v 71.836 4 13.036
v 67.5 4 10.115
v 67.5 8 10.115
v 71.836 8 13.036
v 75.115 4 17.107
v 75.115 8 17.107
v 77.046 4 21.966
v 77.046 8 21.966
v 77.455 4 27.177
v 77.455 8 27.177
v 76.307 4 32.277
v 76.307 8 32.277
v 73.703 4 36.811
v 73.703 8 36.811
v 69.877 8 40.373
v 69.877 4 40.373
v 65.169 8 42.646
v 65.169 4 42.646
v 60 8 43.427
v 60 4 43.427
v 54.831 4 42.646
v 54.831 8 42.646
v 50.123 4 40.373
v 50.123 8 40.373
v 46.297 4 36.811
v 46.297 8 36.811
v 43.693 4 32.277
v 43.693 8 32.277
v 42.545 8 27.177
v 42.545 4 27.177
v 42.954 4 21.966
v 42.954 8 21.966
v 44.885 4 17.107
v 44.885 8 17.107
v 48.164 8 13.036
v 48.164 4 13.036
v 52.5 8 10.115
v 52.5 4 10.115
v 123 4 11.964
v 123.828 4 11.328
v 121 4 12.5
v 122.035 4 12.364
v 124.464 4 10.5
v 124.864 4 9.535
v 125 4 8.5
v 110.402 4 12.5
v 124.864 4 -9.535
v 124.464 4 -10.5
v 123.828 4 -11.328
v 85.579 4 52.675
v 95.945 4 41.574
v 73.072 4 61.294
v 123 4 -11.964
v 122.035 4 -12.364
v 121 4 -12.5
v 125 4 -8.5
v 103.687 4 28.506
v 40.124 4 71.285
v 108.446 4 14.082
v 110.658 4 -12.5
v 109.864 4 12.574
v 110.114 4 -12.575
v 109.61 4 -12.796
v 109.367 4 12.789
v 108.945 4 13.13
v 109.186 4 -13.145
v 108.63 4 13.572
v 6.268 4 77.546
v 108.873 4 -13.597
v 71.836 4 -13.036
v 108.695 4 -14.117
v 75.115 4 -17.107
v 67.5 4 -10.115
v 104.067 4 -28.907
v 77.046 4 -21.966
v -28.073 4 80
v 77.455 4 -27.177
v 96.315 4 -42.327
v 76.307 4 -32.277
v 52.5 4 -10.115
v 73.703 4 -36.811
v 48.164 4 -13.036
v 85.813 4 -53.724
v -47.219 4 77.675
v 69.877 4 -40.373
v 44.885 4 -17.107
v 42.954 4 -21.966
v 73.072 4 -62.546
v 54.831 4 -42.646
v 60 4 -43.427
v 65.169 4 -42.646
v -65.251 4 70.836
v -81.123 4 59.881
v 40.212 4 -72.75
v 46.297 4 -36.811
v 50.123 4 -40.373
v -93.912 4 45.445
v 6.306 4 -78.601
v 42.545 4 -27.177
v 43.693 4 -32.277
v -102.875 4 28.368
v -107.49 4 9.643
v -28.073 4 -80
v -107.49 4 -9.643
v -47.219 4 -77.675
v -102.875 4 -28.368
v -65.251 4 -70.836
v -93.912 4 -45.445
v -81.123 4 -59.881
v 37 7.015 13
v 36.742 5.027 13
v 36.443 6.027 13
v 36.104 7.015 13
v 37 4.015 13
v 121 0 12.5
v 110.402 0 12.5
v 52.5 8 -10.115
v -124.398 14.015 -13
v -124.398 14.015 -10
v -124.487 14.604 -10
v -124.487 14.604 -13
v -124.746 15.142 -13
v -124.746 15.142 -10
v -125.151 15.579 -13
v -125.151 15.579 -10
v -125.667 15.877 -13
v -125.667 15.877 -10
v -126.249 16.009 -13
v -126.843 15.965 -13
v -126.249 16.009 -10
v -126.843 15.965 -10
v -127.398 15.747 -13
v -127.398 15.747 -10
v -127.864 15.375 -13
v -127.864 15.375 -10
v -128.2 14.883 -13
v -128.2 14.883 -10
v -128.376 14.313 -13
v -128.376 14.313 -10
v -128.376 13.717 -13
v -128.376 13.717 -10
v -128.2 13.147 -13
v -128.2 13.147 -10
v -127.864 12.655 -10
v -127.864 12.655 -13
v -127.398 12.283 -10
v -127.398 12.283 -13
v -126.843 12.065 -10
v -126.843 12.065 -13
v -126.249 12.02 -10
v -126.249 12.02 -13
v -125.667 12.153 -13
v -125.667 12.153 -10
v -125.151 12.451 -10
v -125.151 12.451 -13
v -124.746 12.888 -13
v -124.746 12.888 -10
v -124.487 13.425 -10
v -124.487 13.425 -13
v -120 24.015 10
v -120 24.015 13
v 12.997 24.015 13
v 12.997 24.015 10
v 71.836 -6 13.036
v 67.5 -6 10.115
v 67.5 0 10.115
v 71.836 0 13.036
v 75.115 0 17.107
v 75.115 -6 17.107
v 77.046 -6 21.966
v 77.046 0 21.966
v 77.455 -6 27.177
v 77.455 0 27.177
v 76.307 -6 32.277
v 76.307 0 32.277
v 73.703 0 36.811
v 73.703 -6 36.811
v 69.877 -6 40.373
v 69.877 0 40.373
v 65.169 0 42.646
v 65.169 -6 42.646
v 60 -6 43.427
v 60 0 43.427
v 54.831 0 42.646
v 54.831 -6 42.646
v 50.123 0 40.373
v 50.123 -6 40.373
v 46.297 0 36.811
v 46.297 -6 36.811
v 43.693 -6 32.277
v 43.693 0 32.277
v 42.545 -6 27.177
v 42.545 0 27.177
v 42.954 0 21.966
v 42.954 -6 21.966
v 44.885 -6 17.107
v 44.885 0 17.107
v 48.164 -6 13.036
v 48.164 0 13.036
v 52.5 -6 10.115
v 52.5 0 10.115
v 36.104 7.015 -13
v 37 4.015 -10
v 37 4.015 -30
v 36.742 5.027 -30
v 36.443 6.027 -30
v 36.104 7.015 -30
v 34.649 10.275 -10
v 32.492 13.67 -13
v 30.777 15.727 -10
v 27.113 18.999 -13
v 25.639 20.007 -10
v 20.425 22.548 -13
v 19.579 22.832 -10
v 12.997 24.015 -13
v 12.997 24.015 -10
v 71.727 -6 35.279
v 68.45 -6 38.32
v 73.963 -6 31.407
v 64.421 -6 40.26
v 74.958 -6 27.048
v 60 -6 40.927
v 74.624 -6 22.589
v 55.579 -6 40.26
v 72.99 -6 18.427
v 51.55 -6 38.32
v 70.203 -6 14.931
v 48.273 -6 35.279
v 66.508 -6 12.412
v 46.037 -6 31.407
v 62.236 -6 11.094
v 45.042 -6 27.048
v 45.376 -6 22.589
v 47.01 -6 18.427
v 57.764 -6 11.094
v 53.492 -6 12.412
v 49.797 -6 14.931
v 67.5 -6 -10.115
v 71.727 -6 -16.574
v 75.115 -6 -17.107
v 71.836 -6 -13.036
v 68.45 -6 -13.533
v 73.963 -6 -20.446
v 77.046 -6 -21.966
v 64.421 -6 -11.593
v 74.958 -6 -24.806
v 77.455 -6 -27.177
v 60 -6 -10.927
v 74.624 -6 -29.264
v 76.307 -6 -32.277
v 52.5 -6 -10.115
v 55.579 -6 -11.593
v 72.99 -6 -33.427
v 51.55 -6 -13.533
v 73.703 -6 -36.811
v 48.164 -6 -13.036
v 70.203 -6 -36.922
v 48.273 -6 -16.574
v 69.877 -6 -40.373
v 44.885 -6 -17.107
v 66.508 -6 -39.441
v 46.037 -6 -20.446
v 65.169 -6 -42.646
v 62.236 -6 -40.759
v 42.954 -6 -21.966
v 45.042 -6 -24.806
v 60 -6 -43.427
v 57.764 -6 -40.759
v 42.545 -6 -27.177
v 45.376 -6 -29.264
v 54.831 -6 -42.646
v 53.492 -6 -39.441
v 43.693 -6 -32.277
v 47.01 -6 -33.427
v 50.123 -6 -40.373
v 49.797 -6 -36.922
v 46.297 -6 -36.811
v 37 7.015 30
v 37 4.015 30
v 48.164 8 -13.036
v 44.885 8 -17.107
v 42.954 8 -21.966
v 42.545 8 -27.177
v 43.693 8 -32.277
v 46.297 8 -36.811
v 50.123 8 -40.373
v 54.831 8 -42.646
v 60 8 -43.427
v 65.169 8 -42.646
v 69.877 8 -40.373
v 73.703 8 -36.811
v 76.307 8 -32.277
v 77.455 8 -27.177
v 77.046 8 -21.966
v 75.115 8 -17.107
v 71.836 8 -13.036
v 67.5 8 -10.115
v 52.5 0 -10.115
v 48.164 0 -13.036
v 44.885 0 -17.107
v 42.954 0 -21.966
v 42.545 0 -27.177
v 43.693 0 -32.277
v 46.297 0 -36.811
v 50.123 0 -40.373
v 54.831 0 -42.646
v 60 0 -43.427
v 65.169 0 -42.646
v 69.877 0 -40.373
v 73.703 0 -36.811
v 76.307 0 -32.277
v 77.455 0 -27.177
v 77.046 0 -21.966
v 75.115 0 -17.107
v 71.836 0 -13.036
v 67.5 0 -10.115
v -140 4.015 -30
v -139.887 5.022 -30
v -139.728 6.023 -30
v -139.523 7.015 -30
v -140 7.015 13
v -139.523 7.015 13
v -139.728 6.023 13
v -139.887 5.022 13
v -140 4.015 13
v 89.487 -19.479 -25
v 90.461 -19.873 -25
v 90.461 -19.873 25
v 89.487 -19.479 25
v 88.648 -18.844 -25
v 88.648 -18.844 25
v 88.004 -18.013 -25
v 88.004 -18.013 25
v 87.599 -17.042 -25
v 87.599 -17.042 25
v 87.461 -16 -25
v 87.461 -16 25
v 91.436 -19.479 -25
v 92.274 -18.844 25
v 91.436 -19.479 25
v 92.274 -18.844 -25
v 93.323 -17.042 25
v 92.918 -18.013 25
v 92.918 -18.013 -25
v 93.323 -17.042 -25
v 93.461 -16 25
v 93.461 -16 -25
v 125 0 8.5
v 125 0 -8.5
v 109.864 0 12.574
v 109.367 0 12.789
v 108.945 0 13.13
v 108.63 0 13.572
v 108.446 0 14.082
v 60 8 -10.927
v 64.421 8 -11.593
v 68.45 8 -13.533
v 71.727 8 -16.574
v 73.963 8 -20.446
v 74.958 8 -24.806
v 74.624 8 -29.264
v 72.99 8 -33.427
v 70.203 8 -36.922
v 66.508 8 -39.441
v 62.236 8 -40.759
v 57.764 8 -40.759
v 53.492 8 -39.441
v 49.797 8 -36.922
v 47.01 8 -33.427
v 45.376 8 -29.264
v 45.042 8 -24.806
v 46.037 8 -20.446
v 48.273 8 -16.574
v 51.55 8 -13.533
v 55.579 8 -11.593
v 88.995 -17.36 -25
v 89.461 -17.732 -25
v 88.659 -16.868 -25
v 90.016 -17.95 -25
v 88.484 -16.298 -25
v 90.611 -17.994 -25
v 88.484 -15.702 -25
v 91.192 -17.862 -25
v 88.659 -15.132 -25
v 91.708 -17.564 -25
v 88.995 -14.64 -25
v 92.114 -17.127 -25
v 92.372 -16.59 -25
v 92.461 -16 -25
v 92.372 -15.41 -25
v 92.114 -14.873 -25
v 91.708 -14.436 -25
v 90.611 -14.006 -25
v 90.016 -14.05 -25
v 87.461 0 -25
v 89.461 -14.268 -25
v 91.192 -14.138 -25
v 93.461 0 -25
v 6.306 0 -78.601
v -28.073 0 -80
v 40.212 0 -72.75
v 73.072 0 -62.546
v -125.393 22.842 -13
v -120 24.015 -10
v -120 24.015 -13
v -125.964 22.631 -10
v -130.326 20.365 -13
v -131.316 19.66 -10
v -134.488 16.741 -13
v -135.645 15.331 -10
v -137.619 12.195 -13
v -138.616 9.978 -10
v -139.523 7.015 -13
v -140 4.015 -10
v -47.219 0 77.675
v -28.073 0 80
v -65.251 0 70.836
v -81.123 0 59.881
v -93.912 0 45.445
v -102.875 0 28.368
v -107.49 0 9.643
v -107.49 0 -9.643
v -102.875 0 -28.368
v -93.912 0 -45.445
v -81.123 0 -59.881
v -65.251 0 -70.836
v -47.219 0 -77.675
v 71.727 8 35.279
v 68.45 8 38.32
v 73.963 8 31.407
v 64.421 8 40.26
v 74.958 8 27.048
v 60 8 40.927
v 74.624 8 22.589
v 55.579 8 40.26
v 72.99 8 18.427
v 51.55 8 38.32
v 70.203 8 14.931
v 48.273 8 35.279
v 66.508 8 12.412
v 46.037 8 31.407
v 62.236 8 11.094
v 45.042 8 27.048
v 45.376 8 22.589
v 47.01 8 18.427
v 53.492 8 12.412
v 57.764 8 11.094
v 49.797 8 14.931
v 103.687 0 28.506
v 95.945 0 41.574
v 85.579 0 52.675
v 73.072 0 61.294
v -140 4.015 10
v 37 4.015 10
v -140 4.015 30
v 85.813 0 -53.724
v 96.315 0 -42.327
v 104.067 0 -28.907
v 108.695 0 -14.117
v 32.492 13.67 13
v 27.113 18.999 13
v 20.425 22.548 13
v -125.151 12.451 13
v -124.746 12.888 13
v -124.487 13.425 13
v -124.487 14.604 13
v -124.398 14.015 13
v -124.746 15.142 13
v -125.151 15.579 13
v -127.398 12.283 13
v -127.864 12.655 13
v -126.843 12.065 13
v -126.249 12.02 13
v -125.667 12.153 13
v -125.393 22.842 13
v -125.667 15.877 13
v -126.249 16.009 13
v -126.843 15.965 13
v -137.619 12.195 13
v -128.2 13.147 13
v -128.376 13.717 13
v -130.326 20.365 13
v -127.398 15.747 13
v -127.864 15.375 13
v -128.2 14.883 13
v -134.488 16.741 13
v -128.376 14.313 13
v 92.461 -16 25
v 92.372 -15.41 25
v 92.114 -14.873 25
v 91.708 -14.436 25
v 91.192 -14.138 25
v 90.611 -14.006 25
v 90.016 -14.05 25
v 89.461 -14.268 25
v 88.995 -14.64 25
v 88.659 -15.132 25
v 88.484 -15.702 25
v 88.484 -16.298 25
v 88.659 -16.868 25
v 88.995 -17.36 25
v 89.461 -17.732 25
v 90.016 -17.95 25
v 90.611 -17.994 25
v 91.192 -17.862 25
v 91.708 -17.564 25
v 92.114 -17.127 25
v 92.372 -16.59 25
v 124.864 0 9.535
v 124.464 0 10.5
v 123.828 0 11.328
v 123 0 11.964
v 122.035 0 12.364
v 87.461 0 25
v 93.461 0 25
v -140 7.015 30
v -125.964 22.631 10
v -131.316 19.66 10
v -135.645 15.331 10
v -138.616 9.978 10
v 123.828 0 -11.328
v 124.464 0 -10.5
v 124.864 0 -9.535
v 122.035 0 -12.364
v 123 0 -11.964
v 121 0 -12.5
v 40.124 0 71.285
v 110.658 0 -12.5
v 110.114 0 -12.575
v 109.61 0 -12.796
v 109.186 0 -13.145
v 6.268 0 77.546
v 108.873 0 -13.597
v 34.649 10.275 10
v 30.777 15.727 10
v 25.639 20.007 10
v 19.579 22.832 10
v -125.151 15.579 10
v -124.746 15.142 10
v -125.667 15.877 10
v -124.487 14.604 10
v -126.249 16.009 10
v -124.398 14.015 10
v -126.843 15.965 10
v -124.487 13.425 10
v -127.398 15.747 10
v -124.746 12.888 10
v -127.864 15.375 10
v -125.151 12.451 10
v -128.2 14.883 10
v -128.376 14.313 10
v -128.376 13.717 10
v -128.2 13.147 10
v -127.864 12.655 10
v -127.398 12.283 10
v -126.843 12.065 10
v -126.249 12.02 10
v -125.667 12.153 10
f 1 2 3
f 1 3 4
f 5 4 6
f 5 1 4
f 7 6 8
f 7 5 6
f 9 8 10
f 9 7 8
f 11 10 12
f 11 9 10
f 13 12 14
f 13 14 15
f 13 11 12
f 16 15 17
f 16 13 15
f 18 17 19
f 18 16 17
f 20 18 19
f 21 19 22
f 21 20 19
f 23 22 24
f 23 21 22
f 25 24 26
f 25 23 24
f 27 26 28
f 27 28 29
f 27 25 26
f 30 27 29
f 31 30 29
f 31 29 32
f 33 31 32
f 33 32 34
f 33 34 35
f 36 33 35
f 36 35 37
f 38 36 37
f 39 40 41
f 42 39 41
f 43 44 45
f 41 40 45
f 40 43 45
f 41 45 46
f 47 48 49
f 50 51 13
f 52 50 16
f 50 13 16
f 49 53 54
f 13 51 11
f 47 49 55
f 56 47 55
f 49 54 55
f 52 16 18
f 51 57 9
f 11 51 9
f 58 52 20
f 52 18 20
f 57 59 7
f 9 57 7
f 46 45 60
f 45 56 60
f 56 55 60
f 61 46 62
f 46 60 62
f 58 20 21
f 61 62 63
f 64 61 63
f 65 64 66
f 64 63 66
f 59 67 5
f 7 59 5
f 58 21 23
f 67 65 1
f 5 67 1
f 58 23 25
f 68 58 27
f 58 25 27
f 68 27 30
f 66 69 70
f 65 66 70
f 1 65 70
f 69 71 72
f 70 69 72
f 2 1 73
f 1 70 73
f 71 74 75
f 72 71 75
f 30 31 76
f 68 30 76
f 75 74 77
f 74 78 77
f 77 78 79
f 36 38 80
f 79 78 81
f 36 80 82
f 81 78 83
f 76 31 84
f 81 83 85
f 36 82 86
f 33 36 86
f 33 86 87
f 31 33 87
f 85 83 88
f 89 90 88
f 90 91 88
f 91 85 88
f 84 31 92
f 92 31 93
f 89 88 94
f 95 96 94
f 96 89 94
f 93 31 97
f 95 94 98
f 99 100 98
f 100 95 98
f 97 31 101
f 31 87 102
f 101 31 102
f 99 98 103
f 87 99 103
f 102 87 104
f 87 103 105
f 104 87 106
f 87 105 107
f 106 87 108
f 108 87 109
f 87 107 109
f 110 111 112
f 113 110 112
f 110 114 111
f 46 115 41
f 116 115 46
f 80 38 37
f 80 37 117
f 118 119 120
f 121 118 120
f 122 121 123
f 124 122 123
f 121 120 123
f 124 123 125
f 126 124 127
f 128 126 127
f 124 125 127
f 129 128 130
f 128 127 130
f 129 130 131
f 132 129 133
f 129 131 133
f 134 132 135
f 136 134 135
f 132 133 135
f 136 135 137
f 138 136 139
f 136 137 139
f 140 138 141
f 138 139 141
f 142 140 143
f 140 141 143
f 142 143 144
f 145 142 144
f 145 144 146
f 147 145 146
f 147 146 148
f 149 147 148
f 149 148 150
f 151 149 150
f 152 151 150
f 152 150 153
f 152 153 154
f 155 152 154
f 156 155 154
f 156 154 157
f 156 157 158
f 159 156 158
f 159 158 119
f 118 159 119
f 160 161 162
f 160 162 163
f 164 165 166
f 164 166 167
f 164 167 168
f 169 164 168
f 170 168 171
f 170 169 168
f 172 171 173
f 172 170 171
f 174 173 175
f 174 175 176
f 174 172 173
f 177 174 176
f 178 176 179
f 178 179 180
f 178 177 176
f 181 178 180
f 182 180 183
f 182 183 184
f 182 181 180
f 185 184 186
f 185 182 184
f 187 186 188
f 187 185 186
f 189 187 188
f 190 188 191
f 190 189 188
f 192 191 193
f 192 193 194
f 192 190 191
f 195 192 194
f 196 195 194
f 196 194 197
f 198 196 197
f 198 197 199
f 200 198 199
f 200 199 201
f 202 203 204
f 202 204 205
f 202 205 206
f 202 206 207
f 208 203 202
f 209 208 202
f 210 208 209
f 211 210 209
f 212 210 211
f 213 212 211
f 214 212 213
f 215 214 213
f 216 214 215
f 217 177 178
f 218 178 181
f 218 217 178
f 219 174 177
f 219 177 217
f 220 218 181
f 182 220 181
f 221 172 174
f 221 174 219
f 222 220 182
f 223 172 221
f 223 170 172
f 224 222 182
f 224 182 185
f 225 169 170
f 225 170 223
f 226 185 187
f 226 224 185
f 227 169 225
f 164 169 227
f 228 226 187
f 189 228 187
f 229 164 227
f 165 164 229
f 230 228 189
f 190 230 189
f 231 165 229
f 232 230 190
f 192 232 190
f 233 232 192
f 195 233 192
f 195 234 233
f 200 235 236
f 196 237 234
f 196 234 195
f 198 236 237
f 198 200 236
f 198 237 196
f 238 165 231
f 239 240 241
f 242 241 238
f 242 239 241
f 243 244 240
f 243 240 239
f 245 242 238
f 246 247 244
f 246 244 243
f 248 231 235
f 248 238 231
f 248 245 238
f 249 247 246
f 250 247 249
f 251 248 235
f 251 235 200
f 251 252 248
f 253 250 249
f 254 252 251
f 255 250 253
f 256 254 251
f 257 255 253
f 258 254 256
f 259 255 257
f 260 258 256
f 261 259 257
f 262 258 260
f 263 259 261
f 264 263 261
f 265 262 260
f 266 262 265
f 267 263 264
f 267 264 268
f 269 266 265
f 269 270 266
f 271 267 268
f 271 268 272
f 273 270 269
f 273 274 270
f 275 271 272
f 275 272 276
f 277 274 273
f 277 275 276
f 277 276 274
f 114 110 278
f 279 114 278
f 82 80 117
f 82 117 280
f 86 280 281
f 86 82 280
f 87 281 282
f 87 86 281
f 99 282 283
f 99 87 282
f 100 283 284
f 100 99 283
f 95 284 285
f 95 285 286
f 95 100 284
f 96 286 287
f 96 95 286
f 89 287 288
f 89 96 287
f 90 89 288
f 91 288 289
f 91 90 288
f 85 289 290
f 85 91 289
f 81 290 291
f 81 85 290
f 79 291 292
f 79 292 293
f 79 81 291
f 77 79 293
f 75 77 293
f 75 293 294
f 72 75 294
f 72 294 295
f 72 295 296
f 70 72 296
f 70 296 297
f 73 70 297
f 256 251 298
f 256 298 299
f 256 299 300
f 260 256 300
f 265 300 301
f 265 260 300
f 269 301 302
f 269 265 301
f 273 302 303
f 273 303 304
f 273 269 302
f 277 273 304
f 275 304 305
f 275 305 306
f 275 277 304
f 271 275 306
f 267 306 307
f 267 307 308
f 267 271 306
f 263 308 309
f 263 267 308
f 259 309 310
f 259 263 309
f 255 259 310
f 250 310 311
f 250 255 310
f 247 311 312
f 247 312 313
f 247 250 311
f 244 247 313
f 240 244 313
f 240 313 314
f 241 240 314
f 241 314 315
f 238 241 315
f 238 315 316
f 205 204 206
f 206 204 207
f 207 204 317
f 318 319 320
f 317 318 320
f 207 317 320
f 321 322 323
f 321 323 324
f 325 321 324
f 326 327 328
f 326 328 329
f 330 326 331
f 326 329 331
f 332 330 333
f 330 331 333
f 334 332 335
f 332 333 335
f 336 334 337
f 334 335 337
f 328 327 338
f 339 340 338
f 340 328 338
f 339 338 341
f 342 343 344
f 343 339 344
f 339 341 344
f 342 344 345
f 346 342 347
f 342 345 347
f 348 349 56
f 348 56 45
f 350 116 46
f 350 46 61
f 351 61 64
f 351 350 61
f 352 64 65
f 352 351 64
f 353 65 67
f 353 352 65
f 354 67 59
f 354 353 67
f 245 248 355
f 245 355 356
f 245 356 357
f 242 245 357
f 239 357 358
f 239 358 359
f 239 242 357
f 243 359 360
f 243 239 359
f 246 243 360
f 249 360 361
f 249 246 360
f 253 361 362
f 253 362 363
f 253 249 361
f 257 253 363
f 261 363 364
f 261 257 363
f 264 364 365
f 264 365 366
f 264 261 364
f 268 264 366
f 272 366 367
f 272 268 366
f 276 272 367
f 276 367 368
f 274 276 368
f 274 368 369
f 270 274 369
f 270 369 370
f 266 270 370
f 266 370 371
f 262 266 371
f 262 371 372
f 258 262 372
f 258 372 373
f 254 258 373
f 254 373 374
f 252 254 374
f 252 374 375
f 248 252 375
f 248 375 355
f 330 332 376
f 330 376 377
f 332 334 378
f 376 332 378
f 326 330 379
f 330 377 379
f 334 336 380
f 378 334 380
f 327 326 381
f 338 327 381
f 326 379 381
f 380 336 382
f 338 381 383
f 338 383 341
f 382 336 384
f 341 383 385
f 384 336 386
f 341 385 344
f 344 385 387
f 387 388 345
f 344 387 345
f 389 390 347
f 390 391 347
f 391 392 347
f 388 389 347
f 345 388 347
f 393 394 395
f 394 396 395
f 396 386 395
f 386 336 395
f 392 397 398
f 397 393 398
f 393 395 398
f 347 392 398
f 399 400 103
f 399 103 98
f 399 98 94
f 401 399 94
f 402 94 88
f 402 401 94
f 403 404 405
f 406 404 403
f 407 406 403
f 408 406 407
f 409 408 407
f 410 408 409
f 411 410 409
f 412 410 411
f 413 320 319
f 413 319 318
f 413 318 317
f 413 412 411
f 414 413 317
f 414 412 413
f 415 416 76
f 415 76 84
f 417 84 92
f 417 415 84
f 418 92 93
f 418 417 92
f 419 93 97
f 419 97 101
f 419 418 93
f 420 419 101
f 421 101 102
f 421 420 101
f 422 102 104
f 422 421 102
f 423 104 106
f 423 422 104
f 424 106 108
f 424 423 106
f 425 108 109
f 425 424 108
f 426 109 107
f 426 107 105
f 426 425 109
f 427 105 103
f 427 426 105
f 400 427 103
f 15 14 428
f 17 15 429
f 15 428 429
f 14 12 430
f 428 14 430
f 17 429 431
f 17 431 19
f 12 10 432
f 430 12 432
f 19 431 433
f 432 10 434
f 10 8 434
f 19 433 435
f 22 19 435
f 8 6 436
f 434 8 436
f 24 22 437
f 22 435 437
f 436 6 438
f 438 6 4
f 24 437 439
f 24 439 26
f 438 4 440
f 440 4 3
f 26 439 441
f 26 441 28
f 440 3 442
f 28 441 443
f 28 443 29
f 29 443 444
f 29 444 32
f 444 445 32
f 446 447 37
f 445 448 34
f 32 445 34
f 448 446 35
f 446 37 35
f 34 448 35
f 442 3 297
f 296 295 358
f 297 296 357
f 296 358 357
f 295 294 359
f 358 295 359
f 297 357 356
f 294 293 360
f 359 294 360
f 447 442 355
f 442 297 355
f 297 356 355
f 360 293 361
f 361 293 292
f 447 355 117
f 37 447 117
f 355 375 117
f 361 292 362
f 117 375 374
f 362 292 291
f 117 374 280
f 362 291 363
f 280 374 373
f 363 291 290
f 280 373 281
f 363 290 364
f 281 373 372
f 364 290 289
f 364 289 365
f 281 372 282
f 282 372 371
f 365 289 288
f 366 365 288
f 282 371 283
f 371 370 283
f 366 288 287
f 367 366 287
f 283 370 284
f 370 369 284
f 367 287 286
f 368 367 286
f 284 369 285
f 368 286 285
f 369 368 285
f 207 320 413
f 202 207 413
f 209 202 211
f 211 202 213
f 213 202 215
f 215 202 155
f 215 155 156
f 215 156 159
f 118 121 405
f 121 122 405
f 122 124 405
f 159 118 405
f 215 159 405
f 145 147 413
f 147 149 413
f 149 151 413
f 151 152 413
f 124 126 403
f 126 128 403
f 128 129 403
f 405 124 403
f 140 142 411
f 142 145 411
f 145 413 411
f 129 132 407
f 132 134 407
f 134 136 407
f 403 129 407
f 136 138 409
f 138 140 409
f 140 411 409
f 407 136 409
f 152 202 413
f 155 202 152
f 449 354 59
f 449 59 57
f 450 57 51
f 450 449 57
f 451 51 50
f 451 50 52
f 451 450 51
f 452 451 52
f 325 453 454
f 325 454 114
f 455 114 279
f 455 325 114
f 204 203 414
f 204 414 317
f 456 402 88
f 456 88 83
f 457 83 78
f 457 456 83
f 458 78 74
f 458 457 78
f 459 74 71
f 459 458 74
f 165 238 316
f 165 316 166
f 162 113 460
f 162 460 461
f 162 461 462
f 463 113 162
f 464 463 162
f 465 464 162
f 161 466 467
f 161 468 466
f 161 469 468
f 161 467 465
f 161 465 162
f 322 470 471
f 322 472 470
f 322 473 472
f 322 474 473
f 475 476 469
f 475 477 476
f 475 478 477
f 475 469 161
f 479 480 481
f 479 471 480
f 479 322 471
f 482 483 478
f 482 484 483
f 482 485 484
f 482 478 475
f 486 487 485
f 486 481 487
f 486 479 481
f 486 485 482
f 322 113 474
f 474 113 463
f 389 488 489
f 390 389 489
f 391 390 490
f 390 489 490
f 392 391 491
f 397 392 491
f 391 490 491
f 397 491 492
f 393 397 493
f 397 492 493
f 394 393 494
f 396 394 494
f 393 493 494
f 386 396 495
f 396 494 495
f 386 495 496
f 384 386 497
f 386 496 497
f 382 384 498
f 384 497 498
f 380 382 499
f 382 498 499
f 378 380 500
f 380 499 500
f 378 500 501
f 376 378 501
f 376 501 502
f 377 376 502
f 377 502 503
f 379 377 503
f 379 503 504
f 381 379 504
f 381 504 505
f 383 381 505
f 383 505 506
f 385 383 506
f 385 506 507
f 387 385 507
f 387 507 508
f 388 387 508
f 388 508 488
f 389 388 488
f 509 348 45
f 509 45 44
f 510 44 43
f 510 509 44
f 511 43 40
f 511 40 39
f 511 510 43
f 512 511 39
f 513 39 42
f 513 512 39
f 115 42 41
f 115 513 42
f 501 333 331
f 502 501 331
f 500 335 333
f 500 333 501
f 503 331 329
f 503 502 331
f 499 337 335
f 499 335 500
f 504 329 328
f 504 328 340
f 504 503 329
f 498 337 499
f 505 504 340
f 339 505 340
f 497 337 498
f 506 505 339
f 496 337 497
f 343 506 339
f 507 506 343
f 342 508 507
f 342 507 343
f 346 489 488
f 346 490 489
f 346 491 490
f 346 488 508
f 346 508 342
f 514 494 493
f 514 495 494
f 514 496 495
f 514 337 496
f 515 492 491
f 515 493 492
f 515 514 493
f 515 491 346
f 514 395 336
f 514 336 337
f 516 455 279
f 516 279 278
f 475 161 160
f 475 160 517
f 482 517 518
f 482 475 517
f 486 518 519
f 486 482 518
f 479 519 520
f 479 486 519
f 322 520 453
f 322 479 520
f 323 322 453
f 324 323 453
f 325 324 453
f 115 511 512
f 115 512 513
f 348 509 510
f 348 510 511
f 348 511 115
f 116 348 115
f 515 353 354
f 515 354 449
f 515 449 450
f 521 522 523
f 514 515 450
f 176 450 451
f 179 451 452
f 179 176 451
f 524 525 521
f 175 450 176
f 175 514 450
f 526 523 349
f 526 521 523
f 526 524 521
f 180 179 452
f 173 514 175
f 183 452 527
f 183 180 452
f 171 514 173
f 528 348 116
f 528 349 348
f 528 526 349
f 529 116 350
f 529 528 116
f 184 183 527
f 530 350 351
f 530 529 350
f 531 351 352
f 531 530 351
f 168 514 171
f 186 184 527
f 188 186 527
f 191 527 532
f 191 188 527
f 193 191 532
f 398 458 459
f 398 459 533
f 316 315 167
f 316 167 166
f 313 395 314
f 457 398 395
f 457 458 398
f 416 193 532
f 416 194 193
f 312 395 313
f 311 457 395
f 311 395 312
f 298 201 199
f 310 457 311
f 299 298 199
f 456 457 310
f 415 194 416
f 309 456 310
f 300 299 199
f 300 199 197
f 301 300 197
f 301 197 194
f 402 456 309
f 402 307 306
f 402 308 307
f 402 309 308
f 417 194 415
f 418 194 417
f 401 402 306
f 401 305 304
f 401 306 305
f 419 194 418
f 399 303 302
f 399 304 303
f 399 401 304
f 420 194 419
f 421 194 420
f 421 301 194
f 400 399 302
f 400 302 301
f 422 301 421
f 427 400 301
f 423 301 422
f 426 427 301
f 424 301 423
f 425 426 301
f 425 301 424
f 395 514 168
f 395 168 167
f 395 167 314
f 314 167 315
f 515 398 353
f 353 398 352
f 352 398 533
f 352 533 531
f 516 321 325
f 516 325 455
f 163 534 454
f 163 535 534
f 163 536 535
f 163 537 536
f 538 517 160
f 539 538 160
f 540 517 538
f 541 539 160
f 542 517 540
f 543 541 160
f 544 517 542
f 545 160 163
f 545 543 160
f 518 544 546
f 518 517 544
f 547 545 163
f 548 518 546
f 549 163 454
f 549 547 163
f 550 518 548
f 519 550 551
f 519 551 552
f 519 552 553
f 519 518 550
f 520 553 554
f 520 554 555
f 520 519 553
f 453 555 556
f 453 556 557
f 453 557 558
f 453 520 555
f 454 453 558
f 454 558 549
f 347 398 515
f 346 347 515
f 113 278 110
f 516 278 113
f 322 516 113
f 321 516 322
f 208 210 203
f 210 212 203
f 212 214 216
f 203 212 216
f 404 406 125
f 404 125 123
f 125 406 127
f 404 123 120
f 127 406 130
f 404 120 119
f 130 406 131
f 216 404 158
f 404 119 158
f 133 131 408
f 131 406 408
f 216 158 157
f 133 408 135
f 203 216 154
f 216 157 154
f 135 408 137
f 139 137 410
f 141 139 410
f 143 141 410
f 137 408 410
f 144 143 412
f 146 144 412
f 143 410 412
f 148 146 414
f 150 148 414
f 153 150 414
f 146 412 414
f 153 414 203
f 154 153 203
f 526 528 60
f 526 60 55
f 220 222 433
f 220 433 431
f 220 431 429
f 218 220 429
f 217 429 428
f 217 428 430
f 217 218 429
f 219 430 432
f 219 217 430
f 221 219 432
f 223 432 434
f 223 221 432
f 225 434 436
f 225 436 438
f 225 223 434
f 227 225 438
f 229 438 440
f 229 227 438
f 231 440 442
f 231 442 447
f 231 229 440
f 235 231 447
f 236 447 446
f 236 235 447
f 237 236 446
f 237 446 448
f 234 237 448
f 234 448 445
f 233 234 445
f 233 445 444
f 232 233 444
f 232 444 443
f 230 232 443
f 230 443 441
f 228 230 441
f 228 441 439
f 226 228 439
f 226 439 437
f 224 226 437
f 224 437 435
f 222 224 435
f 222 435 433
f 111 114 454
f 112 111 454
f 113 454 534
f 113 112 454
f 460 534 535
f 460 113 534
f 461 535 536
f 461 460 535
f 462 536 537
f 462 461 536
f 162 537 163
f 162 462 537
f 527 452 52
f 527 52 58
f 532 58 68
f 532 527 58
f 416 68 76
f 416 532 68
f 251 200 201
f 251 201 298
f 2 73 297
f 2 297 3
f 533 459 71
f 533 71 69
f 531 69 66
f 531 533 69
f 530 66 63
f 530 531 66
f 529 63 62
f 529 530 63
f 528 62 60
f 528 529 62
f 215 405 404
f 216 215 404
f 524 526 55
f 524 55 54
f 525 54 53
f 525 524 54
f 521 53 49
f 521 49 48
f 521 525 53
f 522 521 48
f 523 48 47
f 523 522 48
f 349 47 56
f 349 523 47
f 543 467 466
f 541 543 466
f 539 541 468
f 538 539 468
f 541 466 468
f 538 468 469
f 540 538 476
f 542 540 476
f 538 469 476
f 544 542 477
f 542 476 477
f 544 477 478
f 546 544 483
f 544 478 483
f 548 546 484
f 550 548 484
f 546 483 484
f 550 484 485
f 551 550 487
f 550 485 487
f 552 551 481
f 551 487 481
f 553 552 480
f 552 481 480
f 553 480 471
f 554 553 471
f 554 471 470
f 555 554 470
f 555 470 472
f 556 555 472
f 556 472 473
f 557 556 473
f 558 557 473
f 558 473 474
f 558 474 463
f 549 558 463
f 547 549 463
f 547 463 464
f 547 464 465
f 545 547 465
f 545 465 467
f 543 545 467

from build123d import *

# Parameters (mm, degrees)
BOSS_EXTRUDE1_DEPTH      = 4
BOSS_EXTRUDE2_DEPTH      = 4
BOSS_EXTRUDE2_DEPTH_BACK = 10
SKETCH2_R                = 15
CUT_EXTRUDE1_START       = -40
SKETCH3_R                = 15
CUT_EXTRUDE1_DEPTH       = 40
SKETCH4_W                = 6
SKETCH4_H                = 50
BOSS_EXTRUDE3_DEPTH      = 20
SKETCH5_R                = 2
CUT_EXTRUDE2_DEPTH       = 59
FILLET1_R                = 4
BOSS_EXTRUDE4_DEPTH      = 177
BOSS_EXTRUDE4_2_DEPTH    = 177
CUT_EXTRUDE3_DEPTH       = 48
SKETCH8_R                = 2
CUT_EXTRUDE4_DEPTH       = 48


with BuildPart() as part:
    # Sketch1 → Boss-Extrude1 (new body)
    with BuildSketch(Plane(origin=(0, 0, 0), x_dir=(1, 0, 0), z_dir=(0, 1, 0))):
        with BuildLine():
            Line((110.657779677, 12.5), (121, 12.5))
            ThreePointArc((121, 12.5), (123.828427125, 11.328427125), (125, 8.5))
            Line((125, 8.5), (125, -8.5))
            ThreePointArc((125, -8.5), (123.828427125, -11.328427125), (121, -12.5))
            Line((121, -12.5), (110.401806797, -12.5))
            ThreePointArc((110.401806797, -12.5), (109.144019868, -12.945017028), (108.445969541, -14.082027957))
            ThreePointArc((108.445969541, -14.082027957), (95.944653725, -41.573721876), (73.071805054, -61.29449583))
            ThreePointArc((73.071805054, -61.29449583), (23.283379571, -74.88735697), (-28.073353846, -80))
            ThreePointArc((-28.073353846, -80), (-108.073353846, 0), (-28.073353846, 80))
            ThreePointArc((-28.073353846, 80), (23.354156646, 76.227477824), (73.071805054, 62.546242656))
            ThreePointArc((73.071805054, 62.546242656), (96.314926426, 42.326708807), (108.694869144, 14.116617376))
            ThreePointArc((108.694869144, 14.116617376), (109.386316986, 12.956179213), (110.657779677, 12.5))
        make_face()
    extrude(amount=BOSS_EXTRUDE1_DEPTH)

    # Sketch2 → Boss-Extrude2 (add, two sides: drawn at the far end of the back side and taken through both)
    with BuildSketch(Plane(origin=(0, 4, 0), x_dir=(1, 0, 0), z_dir=(0, 1, 0)).offset(-BOSS_EXTRUDE2_DEPTH_BACK)):
        with BuildLine():
            Line((67.5, 10.115173029), (67.5, -10.115173029))
            ThreePointArc((67.5, -10.115173029), (60, -43.42656133), (52.5, -10.115173029))
            Line((52.5, -10.115173029), (52.5, 10.115173029))
            ThreePointArc((52.5, 10.115173029), (60, 43.42656133), (67.5, 10.115173029))
        make_face()
        with Locations(Location((60, 25.92656133, 0), (0, 0, 270))):
            Circle(SKETCH2_R, mode=Mode.SUBTRACT)
        with Locations(Location((60, -25.92656133, 0), (0, 0, 270))):
            Circle(SKETCH2_R, mode=Mode.SUBTRACT)
    extrude(amount=BOSS_EXTRUDE2_DEPTH + BOSS_EXTRUDE2_DEPTH_BACK)

    # Sketch3 → Cut-Extrude1 (cut)
    with BuildSketch(Plane(origin=(0, 4, 0), x_dir=(1, 0, 0), z_dir=(0, 1, 0)).offset(CUT_EXTRUDE1_START)):
        with Locations(Location((60, 25.92656133, 0), (0, 0, 270))):
            Circle(SKETCH3_R)
        with Locations(Location((60, -25.92656133, 0), (0, 0, 270))):
            Circle(SKETCH3_R)
    extrude(amount=CUT_EXTRUDE1_DEPTH, mode=Mode.SUBTRACT)

    # Sketch4 → Boss-Extrude3 (add)
    with BuildSketch(Plane.XZ):
        with Locations((90.461255122, 0)):
            Rectangle(SKETCH4_W, SKETCH4_H)
    extrude(amount=BOSS_EXTRUDE3_DEPTH)

    # Sketch5 → Cut-Extrude2 (cut)
    with BuildSketch(Plane.XY.offset(25)):
        with Locations((90.461255122, -16)):
            Circle(SKETCH5_R)
    extrude(amount=-CUT_EXTRUDE2_DEPTH, mode=Mode.SUBTRACT)

    # Fillet1
    # the kernel refuses this fillet: 4 mm, written as the material it takes off along each edge
    with BuildSketch(Plane(origin=(87.461255122, -20, 35), x_dir=(0, 1, 0), z_dir=(0, 0, -1)), Plane(origin=(93.461255122, -20, -35), x_dir=(0, 1, 0), z_dir=(0, 0, 1))) as fillet1_piece_1:
        with BuildLine():
            CenterArc((FILLET1_R, FILLET1_R), FILLET1_R, 180, 90)
            Line((0, FILLET1_R), (0, 0))
            Line((0, 0), (FILLET1_R, 0))
        make_face()
    extrude(amount=70, mode=Mode.SUBTRACT)


with BuildPart() as body_2:
    # Sketch6 → Boss-Extrude4 (new body)
    with BuildSketch(Plane(origin=(-140, 0, 0), x_dir=(0, 0, -1), z_dir=(1, 0, 0))):
        Polygon((-10, 24.014870056), (-10, 4.014870056), (-30, 4.014870056), (-30, 7.014870056), (-13, 7.014870056), (-13, 24.014870056), align=None)
    extrude(amount=BOSS_EXTRUDE4_DEPTH)


with BuildPart() as body_3:
    # Sketch6 → Boss-Extrude4 2 (new body)
    with BuildSketch(Plane(origin=(-140, 0, 0), x_dir=(0, 0, -1), z_dir=(1, 0, 0))):
        Polygon((10, 4.014870056), (30, 4.014870056), (30, 7.014870056), (13, 7.014870056), (13, 24.014870056), (10, 24.014870056), align=None)
    extrude(amount=BOSS_EXTRUDE4_2_DEPTH)


with BuildPart() as cut_extrude3_tool:
    # Sketch7 → Cut-Extrude3 (new body)
    with BuildSketch(Plane.XY.offset(13)):
        with BuildLine():
            Line((-140, 4.014870056), (-157.204632891, 4.014870056))
            Line((-157.204632891, 4.014870056), (-157.204632891, 69.663606964))
            Line((-157.204632891, 69.663606964), (45.151142149, 69.663606964))
            Line((45.151142149, 69.663606964), (37, 4.014870056))
            ThreePointArc((37, 4.014870056), (27.360000088, 18.8152233), (10.479723785, 24.014870056))
            Line((10.479723785, 24.014870056), (10.479723785, 49.759760239))
            Line((10.479723785, 49.759760239), (-96.940208084, 49.759760239))
            Line((-96.940208084, 49.759760239), (-116.097630779, 24.014870056))
            ThreePointArc((-116.097630779, 24.014870056), (-132.190951013, 18.965212808), (-140, 4.014870056))
        make_face()
    extrude(amount=-CUT_EXTRUDE3_DEPTH)


with BuildPart() as body_2_1:
    add(body_2.part)

    # Cut-Extrude3: cut by cut_extrude3_tool
    add(cut_extrude3_tool.part, mode=Mode.SUBTRACT)


with BuildPart() as body_3_1:
    add(body_3.part)

    # Cut-Extrude3: cut by cut_extrude3_tool
    add(cut_extrude3_tool.part, mode=Mode.SUBTRACT)


with BuildPart() as cut_extrude4_tool:
    # Sketch8 → Cut-Extrude4 (new body)
    with BuildSketch(Plane.XY.offset(13)):
        with Locations((-126.398152124, 14.014870056)):
            Circle(SKETCH8_R)
    extrude(amount=-CUT_EXTRUDE4_DEPTH)


with BuildPart() as body_2_2:
    add(body_2_1.part)

    # Cut-Extrude4: cut by cut_extrude4_tool
    add(cut_extrude4_tool.part, mode=Mode.SUBTRACT)


with BuildPart() as body_3_2:
    add(body_3_1.part)

    # Cut-Extrude4: cut by cut_extrude4_tool
    add(cut_extrude4_tool.part, mode=Mode.SUBTRACT)


solid = Compound([part.part, body_2_2.part, body_3_2.part])
